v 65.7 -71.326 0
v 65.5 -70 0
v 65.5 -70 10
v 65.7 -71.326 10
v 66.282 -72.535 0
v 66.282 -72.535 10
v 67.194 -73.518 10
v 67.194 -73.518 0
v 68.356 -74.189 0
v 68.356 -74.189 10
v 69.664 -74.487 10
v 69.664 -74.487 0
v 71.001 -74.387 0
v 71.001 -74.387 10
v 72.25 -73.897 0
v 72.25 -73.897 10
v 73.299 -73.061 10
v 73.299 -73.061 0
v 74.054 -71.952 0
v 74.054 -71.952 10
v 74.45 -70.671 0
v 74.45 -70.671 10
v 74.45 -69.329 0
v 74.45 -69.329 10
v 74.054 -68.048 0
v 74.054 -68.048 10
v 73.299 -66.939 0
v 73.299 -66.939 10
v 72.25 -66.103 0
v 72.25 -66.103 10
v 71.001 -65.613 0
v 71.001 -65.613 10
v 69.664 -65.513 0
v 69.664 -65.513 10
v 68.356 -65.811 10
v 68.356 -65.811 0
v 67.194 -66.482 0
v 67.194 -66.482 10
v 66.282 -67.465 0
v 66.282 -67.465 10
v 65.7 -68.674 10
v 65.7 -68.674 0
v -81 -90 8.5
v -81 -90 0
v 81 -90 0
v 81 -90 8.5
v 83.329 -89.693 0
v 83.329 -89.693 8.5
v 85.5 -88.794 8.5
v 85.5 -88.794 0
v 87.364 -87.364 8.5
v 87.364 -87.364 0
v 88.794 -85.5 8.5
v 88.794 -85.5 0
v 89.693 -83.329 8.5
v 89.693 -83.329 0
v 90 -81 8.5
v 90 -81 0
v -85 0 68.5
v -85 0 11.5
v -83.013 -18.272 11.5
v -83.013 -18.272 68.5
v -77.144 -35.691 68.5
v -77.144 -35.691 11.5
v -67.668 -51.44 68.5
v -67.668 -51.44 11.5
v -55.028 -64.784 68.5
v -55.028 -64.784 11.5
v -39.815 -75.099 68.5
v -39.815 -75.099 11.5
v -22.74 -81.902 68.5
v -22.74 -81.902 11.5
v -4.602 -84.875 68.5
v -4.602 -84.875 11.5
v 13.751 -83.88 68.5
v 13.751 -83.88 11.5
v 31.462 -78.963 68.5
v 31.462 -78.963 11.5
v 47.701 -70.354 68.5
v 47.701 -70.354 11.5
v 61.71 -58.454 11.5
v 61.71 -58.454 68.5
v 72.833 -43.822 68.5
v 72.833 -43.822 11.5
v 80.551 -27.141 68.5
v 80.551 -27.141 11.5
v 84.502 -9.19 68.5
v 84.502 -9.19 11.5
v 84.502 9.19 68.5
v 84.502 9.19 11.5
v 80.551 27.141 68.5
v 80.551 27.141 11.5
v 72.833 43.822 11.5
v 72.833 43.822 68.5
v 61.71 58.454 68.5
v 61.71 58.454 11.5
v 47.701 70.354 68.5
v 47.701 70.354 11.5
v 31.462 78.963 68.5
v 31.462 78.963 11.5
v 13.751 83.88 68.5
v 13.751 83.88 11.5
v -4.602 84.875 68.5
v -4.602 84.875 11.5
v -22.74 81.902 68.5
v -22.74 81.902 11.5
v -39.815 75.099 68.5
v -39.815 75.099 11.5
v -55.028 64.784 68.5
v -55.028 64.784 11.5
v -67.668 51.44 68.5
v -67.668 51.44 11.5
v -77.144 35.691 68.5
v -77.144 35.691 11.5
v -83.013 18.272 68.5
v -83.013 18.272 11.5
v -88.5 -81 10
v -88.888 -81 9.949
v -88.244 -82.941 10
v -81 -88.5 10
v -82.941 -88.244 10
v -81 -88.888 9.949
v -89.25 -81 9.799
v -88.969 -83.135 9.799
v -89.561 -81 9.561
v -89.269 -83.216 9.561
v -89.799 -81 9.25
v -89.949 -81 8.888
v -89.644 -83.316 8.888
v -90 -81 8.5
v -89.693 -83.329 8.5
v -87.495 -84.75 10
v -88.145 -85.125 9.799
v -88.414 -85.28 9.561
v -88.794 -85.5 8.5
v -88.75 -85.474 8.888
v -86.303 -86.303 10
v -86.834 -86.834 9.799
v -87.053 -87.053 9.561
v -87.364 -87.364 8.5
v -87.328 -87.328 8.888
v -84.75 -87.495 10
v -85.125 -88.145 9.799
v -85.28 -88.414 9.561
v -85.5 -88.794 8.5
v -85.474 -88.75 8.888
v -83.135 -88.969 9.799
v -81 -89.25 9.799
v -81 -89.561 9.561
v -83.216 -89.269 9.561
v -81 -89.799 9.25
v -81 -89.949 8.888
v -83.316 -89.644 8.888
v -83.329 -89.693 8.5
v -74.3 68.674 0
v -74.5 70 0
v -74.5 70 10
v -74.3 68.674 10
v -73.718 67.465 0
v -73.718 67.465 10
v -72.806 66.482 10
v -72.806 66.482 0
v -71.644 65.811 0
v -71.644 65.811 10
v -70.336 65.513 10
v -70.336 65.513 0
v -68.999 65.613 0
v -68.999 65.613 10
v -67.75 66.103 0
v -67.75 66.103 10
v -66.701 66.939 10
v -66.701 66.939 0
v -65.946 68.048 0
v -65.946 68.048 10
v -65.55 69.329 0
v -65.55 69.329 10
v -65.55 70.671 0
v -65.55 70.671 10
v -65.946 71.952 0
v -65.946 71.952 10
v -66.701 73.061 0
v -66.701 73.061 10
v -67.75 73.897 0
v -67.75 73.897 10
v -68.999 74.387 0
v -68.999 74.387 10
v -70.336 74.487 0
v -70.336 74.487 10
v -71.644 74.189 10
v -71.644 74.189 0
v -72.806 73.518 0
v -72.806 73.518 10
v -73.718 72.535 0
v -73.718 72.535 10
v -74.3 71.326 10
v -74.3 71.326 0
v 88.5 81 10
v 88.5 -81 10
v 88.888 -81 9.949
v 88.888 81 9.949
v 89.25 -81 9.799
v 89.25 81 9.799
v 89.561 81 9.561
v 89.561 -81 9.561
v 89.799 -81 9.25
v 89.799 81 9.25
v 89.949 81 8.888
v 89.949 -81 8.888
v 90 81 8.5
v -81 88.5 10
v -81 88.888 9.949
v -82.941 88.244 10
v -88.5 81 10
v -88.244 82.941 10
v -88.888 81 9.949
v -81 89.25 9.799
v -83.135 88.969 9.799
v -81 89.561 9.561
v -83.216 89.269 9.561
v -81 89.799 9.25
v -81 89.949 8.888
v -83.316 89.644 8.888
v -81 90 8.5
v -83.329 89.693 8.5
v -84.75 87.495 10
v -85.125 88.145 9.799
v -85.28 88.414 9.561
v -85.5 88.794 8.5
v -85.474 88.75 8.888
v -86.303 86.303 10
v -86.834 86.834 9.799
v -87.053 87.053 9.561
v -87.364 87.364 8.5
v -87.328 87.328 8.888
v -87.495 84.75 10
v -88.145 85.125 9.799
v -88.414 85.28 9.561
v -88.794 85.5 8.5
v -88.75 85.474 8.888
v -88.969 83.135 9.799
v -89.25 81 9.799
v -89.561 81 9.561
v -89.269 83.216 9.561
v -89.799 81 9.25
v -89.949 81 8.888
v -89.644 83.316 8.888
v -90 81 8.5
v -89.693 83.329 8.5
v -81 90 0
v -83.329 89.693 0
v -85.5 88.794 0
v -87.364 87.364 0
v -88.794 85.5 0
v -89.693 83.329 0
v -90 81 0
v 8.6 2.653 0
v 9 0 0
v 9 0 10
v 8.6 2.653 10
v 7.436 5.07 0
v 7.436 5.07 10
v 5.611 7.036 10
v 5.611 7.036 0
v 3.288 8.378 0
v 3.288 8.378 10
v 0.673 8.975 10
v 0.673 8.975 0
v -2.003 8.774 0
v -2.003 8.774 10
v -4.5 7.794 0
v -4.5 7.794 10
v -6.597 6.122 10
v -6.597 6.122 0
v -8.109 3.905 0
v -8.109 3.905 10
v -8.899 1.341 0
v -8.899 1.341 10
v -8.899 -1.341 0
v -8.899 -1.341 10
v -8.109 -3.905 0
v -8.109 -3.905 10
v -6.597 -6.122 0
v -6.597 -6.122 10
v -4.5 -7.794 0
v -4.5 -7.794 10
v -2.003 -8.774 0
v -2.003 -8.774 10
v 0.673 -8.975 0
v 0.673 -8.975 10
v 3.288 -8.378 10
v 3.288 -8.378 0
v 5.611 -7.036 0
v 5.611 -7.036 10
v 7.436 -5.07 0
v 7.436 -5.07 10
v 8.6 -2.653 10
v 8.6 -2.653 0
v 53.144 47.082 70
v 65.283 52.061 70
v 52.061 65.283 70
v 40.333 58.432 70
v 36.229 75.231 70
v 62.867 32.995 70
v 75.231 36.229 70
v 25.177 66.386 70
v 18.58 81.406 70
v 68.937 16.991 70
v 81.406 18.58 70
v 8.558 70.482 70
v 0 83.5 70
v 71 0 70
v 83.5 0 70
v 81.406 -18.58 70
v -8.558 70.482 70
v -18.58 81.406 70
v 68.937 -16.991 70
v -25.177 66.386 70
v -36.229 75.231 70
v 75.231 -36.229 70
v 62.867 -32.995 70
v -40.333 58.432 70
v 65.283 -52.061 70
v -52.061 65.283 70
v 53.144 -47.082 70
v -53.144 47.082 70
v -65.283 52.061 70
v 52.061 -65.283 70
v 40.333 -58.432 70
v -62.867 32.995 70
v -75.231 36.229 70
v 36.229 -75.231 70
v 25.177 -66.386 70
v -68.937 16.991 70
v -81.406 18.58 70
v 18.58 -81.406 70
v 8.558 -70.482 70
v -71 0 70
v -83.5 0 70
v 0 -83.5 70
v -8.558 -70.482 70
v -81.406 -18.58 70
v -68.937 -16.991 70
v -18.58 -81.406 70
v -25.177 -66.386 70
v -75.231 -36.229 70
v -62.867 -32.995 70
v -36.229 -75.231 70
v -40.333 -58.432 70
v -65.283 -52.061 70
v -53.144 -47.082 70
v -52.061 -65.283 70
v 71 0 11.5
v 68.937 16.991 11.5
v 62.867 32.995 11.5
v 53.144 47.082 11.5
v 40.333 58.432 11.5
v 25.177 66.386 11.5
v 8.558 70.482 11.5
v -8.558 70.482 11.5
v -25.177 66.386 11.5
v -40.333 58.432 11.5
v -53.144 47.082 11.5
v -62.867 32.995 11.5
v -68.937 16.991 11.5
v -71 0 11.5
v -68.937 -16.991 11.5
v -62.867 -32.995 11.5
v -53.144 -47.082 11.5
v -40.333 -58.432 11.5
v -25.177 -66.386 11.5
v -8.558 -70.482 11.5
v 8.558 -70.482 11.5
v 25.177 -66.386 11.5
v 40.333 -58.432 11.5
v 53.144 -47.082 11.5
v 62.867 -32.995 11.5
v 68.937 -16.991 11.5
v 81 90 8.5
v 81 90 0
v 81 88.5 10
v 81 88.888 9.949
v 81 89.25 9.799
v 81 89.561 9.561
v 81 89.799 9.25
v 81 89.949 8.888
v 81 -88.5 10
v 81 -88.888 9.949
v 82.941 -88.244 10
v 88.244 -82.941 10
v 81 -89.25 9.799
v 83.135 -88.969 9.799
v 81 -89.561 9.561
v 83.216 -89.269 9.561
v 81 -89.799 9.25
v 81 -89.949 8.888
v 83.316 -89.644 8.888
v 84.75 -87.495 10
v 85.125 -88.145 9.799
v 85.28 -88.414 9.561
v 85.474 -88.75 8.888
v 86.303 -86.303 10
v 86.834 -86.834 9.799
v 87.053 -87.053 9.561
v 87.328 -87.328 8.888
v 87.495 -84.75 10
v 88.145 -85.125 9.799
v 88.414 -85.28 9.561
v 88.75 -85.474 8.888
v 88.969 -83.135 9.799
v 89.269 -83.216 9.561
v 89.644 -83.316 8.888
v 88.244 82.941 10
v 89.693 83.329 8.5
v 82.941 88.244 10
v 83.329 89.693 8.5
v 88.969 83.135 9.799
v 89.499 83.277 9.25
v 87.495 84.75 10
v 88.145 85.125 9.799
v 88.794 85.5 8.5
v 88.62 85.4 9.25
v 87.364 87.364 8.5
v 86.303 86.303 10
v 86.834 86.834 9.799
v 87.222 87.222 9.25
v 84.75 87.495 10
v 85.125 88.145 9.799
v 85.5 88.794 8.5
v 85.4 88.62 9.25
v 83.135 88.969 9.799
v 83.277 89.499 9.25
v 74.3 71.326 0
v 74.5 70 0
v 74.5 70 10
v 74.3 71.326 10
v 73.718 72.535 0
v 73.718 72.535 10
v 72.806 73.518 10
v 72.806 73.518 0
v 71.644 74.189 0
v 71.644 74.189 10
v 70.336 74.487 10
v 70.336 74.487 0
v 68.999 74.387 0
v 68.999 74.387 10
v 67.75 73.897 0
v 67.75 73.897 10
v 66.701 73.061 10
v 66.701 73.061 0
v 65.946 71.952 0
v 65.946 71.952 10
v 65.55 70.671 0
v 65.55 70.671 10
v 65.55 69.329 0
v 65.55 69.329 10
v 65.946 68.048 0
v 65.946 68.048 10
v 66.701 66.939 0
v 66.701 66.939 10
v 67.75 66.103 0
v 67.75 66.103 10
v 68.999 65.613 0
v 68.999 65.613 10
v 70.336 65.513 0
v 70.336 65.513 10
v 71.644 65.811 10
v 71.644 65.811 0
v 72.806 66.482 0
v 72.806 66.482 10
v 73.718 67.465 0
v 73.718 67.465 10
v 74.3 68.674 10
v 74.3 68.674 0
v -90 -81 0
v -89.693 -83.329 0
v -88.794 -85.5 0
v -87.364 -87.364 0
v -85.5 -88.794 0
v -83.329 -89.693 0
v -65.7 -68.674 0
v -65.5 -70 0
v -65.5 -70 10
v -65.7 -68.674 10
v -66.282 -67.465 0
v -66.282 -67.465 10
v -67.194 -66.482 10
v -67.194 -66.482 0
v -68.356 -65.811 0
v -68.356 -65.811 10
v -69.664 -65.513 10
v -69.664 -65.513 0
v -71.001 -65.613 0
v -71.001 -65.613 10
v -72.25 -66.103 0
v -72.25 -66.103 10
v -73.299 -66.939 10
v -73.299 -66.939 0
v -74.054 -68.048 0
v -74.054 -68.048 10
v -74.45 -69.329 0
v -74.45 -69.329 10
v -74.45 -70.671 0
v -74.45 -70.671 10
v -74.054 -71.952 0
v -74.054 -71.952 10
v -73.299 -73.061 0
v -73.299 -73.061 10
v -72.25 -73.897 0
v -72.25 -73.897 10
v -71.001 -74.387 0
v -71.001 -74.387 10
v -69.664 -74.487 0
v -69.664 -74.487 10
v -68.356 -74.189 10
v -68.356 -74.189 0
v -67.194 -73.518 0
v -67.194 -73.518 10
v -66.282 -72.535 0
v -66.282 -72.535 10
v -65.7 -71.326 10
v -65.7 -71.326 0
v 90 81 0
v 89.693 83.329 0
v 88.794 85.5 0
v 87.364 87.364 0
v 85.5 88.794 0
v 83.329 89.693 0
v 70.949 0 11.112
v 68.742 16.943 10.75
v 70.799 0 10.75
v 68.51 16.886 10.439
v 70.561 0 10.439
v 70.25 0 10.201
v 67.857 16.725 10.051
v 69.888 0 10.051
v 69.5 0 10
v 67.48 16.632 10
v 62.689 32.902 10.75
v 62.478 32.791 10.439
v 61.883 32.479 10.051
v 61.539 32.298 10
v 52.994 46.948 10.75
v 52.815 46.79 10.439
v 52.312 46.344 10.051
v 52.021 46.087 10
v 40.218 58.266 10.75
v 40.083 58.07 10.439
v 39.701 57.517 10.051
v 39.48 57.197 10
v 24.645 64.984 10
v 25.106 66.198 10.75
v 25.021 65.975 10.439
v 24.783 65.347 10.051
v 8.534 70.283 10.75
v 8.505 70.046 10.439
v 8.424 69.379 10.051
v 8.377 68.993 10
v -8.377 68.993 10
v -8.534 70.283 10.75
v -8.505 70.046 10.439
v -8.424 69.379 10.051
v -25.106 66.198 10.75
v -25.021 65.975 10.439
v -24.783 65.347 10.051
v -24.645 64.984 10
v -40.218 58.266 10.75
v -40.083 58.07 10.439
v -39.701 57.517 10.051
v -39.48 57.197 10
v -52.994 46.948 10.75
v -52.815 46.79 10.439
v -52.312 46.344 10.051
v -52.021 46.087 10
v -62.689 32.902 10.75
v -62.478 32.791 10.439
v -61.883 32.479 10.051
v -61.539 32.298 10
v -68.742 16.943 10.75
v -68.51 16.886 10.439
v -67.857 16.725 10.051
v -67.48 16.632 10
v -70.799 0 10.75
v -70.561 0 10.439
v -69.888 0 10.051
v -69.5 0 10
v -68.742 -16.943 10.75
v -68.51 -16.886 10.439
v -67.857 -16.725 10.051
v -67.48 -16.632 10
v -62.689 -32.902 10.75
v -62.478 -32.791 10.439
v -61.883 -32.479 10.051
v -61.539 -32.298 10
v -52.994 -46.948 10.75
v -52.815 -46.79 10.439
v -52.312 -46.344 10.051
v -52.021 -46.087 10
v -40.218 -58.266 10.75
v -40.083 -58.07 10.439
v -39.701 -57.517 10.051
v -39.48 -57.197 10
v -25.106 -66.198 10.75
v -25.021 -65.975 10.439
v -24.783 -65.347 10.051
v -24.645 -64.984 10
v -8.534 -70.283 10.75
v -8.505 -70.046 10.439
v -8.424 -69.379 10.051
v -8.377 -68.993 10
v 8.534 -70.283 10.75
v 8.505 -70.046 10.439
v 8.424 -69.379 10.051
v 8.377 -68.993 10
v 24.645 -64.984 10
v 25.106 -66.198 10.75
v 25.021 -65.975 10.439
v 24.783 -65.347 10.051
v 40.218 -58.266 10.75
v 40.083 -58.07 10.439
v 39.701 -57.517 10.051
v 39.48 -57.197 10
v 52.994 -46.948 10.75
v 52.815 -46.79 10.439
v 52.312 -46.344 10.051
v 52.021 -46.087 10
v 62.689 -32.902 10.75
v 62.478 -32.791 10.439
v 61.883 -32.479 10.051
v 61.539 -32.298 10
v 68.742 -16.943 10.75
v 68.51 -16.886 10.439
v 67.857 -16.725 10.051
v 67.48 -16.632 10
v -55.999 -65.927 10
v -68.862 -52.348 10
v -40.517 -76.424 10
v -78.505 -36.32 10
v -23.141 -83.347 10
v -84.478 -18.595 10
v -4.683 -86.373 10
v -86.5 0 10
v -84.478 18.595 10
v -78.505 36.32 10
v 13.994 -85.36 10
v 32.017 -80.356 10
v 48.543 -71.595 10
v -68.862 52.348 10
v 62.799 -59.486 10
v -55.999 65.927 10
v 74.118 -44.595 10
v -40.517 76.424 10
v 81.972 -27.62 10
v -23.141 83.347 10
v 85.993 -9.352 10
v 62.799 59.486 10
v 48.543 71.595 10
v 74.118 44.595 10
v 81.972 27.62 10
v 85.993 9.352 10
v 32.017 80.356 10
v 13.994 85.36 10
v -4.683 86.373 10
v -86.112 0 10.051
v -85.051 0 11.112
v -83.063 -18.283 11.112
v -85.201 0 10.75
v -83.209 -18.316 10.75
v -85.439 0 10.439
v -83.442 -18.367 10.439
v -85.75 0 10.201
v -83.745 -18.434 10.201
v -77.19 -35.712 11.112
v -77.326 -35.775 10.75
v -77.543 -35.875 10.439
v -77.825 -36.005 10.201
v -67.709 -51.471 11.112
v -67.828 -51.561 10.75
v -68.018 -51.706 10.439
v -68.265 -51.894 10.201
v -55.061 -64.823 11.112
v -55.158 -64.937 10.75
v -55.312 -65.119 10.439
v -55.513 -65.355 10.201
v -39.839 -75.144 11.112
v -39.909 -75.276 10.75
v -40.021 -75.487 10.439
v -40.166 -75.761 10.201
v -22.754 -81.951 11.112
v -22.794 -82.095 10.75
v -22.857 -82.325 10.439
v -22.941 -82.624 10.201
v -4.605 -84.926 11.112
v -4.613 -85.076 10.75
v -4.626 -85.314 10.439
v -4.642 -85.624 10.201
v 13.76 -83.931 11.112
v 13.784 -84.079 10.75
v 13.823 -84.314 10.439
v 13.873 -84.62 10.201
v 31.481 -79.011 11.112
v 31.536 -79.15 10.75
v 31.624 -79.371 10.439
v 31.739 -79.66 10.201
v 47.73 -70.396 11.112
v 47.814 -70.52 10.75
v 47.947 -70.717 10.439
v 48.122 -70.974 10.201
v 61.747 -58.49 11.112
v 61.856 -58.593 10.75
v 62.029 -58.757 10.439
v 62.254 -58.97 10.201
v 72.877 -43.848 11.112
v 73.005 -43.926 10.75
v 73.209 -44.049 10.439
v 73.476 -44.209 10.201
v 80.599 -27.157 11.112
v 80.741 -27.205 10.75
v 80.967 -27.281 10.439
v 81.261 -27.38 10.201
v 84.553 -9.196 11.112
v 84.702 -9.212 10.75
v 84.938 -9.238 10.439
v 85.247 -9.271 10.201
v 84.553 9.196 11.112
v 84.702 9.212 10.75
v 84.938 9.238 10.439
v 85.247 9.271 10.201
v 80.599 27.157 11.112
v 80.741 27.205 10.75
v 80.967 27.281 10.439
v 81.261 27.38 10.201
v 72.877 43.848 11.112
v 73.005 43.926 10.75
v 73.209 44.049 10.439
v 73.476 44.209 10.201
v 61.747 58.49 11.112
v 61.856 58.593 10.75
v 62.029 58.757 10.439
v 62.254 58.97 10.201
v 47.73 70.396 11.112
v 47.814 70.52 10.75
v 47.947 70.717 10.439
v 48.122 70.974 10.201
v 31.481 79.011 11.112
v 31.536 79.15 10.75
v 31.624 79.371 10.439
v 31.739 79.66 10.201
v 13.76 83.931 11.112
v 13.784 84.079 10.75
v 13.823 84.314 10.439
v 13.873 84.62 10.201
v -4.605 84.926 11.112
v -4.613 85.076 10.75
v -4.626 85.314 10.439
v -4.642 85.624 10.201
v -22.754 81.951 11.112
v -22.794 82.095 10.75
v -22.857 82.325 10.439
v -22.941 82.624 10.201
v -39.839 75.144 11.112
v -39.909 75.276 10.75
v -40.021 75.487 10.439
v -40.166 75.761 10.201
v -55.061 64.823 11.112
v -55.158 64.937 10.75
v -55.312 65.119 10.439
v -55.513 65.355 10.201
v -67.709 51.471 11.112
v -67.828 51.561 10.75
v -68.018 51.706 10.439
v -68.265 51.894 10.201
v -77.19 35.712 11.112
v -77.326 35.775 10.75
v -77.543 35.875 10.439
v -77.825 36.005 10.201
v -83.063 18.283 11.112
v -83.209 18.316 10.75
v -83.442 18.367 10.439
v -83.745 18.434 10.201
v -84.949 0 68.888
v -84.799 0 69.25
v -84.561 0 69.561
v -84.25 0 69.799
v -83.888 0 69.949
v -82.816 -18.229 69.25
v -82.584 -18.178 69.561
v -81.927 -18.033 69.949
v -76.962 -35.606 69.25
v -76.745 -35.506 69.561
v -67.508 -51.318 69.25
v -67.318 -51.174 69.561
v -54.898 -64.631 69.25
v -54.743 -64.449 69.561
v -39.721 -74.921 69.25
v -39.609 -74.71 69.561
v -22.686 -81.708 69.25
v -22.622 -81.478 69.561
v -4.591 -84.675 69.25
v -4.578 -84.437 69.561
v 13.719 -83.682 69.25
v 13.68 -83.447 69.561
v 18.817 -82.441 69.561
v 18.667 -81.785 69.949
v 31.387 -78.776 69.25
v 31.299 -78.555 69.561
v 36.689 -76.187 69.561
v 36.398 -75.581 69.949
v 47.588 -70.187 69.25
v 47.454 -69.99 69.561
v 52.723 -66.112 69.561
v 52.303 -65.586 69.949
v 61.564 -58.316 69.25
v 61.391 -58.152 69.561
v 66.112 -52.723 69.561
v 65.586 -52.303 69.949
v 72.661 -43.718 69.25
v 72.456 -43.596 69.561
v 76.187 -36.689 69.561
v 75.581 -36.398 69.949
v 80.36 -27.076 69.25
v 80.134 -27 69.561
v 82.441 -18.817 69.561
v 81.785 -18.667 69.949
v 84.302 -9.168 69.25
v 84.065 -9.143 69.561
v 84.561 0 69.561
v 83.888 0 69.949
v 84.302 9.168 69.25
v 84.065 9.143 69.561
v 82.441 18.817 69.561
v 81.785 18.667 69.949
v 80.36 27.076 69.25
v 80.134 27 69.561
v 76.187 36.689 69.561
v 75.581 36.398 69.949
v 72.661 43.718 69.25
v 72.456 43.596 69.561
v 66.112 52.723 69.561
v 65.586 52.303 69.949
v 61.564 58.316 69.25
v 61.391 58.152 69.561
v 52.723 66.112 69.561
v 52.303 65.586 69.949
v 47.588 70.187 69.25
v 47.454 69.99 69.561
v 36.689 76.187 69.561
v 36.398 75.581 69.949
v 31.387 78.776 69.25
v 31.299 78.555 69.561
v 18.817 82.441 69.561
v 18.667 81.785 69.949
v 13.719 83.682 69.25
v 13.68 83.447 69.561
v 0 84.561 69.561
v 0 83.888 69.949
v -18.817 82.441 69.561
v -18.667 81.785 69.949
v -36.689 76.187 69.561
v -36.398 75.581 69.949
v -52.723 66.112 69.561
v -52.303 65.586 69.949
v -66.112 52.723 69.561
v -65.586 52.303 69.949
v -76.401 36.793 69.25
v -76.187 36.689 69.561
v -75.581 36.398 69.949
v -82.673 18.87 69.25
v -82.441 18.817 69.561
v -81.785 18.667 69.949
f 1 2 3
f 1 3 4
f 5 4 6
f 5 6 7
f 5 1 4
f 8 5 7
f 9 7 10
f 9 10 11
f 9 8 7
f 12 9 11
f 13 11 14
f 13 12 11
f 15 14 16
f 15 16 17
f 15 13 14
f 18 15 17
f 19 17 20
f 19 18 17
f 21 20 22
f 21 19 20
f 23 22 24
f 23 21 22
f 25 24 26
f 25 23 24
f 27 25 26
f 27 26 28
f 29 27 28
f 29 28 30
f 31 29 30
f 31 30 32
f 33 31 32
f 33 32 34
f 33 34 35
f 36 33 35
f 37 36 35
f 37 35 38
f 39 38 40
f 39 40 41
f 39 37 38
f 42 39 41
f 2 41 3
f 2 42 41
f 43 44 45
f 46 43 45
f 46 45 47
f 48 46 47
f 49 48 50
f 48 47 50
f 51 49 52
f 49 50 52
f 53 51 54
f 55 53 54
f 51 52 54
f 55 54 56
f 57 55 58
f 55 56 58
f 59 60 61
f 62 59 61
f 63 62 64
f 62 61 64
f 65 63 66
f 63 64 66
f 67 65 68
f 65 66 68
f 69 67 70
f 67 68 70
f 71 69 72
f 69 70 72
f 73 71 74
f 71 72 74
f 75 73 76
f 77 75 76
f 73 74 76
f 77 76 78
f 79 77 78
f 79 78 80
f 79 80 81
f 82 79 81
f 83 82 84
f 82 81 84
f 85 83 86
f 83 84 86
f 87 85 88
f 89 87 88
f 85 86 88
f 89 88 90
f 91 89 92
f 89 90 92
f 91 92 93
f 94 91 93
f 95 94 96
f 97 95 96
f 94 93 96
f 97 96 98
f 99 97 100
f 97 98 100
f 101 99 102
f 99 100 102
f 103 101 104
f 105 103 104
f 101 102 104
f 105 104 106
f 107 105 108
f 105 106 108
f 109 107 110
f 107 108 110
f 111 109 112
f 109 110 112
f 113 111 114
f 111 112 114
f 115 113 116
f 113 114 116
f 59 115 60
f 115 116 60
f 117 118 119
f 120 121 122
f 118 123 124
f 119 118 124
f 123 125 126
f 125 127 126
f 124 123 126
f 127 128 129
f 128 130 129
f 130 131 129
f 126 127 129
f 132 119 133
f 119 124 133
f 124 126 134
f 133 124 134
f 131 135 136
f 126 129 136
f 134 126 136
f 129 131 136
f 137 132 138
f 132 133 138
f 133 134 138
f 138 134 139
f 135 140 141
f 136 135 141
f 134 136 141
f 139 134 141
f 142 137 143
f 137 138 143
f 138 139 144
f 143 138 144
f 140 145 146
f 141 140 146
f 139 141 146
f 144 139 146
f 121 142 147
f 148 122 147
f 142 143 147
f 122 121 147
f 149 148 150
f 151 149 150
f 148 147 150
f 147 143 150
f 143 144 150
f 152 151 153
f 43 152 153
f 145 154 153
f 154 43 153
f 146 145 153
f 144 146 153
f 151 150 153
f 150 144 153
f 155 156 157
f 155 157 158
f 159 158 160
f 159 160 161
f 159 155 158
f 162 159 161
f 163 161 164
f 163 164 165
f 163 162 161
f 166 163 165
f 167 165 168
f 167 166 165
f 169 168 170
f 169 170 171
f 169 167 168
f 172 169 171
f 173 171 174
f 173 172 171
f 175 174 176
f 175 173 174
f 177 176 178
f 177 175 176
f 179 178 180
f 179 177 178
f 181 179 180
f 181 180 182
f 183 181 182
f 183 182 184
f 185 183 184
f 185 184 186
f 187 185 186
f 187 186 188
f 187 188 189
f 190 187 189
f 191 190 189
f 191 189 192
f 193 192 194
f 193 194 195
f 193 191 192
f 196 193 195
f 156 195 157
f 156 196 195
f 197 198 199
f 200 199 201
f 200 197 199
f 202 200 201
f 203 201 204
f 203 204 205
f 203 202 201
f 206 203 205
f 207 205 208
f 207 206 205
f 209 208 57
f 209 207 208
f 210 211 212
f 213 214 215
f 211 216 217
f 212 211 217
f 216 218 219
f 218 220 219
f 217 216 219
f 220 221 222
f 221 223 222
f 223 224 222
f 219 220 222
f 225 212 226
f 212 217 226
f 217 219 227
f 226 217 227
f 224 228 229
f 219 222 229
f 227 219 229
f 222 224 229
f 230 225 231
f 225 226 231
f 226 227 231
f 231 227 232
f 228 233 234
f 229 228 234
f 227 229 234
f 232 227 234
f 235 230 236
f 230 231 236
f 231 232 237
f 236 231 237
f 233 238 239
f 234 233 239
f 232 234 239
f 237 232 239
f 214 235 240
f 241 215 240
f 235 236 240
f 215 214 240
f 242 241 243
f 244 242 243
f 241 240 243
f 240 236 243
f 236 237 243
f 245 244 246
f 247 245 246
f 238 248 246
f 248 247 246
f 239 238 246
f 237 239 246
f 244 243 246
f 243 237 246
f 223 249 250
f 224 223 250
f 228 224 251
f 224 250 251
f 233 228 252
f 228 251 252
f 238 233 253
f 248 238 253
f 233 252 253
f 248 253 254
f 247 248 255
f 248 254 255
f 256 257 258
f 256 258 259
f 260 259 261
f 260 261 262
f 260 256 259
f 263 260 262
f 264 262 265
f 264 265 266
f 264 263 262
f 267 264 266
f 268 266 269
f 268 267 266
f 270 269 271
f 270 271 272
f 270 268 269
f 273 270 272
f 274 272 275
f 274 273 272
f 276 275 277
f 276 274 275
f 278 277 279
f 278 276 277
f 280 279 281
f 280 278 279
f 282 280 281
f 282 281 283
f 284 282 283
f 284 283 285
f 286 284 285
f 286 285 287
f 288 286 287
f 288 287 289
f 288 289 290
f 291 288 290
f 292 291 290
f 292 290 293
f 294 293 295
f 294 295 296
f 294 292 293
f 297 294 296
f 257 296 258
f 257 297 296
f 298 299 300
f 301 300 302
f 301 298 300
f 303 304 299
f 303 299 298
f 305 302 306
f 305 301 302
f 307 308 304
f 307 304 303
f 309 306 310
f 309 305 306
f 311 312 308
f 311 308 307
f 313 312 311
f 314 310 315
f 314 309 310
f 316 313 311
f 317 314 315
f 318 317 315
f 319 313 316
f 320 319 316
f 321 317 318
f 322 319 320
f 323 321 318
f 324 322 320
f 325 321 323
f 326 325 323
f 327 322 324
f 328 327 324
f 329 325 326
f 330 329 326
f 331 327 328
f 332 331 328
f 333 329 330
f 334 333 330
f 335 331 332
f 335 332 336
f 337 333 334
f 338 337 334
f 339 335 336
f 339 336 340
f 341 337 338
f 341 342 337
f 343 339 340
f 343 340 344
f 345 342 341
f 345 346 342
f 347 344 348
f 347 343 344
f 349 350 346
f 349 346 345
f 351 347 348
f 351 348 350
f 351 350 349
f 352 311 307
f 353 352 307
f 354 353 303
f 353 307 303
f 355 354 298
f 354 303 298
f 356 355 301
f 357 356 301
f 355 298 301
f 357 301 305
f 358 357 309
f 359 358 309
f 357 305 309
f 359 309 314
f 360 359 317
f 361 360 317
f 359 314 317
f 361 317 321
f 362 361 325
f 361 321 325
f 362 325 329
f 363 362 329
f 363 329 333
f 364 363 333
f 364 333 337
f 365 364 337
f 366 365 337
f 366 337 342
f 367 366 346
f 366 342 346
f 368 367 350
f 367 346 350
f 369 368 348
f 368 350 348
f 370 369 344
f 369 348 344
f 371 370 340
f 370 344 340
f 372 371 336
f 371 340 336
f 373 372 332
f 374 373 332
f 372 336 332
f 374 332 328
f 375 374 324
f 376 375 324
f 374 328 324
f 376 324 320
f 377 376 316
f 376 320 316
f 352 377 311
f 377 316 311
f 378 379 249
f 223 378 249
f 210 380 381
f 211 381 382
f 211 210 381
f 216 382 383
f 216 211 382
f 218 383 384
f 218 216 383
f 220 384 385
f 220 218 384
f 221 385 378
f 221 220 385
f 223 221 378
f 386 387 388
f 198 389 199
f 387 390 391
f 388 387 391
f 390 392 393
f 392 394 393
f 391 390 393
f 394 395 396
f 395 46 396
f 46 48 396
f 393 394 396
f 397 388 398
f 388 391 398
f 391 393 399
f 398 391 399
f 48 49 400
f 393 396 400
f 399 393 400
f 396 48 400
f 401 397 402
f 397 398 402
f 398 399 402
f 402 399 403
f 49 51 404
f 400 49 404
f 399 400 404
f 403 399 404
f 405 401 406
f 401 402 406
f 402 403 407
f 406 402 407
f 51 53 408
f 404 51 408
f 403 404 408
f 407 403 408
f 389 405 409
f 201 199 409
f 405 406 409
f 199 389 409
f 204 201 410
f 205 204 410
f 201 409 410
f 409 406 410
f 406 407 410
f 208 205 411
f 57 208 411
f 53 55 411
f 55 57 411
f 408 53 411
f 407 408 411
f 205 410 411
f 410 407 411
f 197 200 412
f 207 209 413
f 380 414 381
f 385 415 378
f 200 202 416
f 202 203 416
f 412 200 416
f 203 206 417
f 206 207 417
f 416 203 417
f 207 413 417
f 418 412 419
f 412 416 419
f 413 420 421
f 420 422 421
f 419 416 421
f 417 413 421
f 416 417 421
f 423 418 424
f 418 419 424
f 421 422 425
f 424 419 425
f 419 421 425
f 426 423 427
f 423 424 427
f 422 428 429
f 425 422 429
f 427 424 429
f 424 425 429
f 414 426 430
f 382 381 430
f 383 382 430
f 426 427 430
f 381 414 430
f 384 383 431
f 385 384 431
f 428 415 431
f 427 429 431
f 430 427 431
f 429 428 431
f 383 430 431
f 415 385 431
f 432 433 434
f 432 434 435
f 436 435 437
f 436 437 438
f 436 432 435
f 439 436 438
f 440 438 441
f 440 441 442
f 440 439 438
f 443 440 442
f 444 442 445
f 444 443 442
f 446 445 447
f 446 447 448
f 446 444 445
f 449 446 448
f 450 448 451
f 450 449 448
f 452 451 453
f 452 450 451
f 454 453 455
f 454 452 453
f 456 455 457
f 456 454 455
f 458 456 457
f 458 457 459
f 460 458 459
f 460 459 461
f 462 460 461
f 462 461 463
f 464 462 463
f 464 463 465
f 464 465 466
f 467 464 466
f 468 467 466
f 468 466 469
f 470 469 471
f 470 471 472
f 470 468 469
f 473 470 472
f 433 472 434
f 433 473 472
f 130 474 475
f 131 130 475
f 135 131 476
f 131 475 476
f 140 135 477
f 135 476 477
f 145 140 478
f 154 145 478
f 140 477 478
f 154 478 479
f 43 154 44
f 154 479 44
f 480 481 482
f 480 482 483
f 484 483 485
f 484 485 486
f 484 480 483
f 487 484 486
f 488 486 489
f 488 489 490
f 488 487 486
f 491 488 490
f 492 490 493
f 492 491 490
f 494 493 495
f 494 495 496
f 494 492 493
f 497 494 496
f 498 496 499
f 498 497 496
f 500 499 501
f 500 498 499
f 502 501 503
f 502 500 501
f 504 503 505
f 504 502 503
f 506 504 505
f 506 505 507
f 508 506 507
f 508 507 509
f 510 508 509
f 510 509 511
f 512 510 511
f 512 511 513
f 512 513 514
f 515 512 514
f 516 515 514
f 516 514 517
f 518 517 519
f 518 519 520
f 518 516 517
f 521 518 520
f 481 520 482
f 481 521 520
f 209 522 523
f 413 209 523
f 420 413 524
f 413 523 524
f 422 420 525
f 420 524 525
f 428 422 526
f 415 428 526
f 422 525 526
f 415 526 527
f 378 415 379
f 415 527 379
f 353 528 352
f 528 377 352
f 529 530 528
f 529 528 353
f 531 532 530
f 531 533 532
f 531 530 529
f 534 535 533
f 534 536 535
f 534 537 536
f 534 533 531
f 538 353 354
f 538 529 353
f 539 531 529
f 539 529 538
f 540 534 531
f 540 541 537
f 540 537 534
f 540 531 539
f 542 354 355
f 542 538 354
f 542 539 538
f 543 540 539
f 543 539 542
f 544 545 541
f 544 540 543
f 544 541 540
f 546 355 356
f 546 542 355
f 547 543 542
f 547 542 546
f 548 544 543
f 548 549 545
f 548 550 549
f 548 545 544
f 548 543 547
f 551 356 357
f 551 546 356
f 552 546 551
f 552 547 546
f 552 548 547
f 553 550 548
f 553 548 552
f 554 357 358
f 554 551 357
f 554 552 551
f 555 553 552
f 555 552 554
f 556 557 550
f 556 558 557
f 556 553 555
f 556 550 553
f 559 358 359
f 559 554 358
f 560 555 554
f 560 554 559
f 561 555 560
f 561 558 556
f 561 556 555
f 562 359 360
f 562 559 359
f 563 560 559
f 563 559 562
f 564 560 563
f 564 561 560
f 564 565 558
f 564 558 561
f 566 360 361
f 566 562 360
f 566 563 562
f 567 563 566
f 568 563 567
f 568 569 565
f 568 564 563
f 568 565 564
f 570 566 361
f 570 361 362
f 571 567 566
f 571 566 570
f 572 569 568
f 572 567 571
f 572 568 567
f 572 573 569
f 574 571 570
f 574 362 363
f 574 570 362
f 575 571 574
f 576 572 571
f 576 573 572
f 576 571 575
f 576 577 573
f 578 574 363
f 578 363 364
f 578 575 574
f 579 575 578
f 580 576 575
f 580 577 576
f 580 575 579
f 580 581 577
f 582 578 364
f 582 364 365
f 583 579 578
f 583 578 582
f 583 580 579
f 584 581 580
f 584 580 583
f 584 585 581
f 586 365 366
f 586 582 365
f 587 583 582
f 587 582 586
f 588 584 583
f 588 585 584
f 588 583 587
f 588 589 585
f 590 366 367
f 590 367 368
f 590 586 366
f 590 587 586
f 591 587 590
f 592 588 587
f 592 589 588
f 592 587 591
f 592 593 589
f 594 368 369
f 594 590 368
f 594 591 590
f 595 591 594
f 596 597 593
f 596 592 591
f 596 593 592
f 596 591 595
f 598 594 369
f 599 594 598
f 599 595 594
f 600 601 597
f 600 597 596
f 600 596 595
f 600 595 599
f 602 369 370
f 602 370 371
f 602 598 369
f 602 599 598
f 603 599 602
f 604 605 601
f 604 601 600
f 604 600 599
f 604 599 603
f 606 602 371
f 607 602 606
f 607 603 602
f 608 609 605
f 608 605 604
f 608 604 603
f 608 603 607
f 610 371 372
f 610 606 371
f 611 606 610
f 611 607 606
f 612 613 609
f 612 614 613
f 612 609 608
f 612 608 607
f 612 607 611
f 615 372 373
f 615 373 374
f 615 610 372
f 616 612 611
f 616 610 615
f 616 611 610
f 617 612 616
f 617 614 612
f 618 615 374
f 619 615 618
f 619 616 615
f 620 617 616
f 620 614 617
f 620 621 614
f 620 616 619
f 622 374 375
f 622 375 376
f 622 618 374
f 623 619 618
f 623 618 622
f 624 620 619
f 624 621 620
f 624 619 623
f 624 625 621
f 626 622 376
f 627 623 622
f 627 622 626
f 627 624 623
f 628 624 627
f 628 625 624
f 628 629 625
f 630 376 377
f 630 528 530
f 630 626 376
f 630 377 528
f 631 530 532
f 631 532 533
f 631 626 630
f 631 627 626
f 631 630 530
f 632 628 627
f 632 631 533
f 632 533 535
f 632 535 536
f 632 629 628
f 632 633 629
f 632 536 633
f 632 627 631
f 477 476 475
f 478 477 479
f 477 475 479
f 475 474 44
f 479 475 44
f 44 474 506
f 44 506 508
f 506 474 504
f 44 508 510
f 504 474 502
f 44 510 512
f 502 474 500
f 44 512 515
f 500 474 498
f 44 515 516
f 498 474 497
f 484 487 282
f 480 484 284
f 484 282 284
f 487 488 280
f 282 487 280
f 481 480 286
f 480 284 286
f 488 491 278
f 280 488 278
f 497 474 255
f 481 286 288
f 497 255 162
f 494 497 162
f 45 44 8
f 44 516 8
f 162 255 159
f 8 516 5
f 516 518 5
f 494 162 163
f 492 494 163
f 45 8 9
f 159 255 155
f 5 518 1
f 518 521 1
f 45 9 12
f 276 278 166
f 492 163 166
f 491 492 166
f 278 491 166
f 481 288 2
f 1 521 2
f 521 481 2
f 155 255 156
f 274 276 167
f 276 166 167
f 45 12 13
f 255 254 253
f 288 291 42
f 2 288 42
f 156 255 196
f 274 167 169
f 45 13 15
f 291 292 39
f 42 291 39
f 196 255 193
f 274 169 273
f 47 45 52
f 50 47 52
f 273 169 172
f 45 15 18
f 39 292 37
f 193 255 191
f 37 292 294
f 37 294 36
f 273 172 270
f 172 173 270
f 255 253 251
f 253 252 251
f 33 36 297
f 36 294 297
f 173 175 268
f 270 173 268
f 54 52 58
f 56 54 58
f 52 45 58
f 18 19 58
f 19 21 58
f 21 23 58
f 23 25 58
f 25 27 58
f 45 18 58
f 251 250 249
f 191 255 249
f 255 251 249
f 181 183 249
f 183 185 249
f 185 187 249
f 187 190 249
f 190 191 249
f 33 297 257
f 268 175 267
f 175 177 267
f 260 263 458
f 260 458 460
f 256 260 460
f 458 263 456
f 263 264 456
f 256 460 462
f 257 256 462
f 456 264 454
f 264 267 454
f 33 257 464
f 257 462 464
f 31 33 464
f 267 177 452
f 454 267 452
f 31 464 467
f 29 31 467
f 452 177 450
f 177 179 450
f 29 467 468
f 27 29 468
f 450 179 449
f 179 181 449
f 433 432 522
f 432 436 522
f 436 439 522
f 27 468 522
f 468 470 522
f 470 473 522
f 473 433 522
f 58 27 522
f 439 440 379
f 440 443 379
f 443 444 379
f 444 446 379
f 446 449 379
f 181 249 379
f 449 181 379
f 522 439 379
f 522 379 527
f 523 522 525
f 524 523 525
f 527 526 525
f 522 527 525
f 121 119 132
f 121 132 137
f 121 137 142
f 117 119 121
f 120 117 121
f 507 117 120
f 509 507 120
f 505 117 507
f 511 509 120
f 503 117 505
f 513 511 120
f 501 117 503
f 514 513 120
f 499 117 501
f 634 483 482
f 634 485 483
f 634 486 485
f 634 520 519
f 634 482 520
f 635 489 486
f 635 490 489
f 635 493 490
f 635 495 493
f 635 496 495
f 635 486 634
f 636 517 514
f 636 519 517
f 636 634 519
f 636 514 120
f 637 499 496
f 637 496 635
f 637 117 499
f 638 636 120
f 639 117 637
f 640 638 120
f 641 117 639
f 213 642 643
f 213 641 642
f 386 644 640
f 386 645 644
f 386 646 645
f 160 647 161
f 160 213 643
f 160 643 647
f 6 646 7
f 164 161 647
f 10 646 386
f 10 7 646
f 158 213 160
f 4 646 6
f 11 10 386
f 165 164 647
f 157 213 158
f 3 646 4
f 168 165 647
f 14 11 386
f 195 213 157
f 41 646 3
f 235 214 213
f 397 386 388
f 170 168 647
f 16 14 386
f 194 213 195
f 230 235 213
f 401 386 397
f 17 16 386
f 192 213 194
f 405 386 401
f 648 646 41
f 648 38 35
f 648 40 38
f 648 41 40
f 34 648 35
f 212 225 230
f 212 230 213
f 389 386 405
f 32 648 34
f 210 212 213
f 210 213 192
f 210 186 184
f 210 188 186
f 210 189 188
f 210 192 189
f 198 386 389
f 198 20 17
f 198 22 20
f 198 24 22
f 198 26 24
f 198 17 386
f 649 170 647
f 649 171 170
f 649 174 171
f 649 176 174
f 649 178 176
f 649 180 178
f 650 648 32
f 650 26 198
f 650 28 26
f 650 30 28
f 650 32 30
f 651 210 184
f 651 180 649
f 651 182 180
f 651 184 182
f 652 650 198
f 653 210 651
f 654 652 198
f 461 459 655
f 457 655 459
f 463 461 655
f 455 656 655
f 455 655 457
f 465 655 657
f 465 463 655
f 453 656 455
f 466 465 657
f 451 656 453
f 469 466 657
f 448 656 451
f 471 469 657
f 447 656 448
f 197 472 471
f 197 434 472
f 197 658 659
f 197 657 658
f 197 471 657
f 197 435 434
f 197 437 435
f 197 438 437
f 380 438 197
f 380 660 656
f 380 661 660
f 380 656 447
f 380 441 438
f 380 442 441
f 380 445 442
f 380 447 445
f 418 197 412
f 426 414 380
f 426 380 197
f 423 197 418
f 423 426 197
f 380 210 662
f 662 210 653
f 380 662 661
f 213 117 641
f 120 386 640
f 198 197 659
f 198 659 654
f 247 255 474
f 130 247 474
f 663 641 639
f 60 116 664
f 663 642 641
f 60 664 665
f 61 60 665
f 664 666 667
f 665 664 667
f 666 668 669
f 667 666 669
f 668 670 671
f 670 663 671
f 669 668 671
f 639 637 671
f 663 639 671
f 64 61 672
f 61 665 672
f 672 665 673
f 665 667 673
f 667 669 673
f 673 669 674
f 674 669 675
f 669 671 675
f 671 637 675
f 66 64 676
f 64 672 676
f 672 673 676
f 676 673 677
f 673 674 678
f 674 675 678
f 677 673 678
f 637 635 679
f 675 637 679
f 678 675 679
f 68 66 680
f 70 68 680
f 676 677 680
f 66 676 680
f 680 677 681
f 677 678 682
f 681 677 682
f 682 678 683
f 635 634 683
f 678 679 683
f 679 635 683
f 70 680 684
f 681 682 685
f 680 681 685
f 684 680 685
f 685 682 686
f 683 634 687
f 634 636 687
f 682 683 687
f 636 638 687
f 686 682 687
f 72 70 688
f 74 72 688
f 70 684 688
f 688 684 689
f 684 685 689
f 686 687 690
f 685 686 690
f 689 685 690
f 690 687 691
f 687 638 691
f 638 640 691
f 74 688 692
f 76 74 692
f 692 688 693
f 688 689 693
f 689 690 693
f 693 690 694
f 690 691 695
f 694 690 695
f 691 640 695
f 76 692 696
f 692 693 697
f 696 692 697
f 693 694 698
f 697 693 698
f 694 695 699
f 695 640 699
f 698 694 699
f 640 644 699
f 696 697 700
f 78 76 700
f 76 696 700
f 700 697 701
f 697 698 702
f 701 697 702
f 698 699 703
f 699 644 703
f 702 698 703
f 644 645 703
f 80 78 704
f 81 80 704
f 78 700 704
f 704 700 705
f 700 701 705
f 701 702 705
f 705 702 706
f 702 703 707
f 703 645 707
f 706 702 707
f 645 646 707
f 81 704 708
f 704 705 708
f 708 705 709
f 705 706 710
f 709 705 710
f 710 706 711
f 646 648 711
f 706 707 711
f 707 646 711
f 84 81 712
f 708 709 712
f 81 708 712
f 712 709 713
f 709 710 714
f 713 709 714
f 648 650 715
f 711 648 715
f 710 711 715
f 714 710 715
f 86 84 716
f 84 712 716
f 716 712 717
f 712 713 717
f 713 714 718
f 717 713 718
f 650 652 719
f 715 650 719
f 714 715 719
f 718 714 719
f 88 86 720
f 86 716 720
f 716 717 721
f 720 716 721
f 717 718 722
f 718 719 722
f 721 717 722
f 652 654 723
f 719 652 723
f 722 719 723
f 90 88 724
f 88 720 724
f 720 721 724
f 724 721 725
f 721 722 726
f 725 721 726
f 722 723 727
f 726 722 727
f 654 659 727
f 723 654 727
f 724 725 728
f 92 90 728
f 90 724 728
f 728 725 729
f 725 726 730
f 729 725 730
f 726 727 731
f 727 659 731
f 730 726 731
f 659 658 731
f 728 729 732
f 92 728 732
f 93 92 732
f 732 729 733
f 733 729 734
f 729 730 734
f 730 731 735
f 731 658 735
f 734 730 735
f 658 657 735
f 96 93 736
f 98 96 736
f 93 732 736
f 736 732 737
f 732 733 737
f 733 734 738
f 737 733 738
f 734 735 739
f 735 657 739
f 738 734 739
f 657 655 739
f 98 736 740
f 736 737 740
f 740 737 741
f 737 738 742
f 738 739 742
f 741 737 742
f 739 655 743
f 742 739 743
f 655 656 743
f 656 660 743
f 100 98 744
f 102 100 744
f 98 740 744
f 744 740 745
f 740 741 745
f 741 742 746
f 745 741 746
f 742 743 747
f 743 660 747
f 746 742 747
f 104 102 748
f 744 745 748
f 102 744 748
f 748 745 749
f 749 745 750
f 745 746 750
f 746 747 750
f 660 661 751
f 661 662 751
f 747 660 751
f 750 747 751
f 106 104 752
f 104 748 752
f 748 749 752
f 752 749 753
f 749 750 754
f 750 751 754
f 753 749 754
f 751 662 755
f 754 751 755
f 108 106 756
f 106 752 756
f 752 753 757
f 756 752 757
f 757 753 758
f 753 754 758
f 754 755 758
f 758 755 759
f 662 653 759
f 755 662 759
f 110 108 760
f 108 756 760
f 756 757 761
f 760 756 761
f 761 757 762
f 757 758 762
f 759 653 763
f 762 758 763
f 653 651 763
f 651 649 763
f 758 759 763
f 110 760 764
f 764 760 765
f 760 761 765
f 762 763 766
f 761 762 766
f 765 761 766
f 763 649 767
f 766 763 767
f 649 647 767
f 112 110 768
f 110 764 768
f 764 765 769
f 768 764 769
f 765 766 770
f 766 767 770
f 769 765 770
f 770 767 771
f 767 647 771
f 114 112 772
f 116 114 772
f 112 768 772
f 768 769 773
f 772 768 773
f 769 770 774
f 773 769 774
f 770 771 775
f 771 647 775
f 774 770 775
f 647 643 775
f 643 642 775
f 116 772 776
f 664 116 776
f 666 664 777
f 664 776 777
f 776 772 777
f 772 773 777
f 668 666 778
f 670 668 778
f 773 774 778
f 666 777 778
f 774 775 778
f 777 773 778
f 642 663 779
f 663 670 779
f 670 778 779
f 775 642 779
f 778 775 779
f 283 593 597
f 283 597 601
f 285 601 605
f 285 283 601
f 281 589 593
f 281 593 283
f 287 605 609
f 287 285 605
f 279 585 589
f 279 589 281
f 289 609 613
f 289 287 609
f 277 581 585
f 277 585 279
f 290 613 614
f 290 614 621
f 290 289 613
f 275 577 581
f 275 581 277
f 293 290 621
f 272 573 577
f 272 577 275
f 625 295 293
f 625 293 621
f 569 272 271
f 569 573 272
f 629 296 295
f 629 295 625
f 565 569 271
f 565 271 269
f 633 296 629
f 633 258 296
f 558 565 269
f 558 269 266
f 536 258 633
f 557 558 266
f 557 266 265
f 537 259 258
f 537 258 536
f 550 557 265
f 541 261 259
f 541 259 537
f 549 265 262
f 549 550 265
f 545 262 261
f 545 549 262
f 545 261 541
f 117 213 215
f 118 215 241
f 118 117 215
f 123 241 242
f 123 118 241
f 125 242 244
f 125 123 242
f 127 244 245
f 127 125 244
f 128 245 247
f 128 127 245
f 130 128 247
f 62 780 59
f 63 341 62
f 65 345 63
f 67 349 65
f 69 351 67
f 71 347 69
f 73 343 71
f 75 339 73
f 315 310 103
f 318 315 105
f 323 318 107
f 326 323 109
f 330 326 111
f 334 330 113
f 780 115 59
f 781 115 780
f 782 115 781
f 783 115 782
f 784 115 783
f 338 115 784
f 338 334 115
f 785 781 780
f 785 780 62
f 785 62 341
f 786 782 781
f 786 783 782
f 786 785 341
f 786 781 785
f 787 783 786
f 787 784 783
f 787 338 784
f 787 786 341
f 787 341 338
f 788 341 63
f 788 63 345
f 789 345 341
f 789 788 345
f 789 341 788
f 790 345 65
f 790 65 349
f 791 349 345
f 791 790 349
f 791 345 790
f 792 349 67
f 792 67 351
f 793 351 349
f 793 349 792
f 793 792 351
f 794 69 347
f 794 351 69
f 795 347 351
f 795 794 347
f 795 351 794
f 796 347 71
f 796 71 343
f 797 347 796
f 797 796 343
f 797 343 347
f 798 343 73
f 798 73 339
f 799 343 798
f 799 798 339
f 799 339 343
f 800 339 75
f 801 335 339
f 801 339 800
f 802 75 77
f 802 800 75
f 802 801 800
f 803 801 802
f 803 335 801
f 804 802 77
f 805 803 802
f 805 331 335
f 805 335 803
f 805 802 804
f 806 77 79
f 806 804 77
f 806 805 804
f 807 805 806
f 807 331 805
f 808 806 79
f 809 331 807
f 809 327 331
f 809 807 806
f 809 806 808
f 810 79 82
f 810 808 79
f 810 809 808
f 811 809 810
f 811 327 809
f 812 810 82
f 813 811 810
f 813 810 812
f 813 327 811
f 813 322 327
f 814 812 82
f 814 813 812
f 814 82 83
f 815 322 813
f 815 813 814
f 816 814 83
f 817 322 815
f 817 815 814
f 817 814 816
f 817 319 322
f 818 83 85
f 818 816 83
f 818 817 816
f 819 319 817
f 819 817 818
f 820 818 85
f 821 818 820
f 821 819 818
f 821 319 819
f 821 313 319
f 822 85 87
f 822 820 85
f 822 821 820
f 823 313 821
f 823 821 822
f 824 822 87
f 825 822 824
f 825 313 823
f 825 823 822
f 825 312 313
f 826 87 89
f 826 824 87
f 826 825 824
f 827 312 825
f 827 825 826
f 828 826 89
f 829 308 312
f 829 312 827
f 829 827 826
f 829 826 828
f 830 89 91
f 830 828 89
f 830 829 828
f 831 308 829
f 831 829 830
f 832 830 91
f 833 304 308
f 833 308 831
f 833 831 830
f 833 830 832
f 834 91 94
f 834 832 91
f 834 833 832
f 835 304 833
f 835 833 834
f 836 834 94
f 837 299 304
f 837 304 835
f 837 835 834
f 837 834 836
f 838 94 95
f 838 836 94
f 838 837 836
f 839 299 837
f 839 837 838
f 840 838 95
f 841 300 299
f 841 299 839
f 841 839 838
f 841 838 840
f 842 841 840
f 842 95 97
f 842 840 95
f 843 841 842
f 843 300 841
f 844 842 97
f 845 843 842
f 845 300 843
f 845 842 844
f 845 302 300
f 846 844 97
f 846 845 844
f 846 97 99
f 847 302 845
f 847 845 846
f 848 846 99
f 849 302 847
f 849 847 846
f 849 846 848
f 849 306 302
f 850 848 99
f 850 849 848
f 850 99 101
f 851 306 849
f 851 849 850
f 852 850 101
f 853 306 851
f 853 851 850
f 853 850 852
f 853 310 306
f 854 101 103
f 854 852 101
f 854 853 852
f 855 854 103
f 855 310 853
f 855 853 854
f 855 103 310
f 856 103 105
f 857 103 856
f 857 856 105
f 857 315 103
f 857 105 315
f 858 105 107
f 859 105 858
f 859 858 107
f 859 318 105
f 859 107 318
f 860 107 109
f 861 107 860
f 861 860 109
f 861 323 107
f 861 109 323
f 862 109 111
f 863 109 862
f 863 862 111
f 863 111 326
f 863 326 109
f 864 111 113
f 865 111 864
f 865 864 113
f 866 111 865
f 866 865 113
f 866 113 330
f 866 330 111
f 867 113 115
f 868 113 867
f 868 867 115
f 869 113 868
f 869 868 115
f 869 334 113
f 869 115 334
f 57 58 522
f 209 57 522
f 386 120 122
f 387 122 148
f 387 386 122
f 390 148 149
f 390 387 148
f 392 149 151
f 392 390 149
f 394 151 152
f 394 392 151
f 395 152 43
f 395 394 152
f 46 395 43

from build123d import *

# Parameters (mm, degrees)
SKETCH1_R           = 9
SKETCH1_R_2         = 4.5
BOSS_EXTRUDE1_DEPTH = 10
SKETCH2_R           = 85
BOSS_EXTRUDE2_DEPTH = 60
SKETCH3_R           = 71
CUT_EXTRUDE1_DEPTH  = 60
FILLET1_R           = 1.5


with BuildPart() as part:
    # Sketch1 → Boss-Extrude1 (new body)
    with BuildSketch(Plane.XY):
        with BuildLine():
            Line((-81, -90), (81, -90))
            ThreePointArc((81, -90), (87.363961031, -87.363961031), (90, -81))
            Line((90, -81), (90, 81))
            ThreePointArc((90, 81), (87.363961031, 87.363961031), (81, 90))
            Line((81, 90), (-81, 90))
            ThreePointArc((-81, 90), (-87.363961031, 87.363961031), (-90, 81))
            Line((-90, 81), (-90, -81))
            ThreePointArc((-90, -81), (-87.363961031, -87.363961031), (-81, -90))
        make_face()
        Circle(SKETCH1_R, mode=Mode.SUBTRACT)
        with Locations((70, 70)):
            Circle(SKETCH1_R_2, mode=Mode.SUBTRACT)
        with Locations(Location((-70, 70, 0), (0, 0, 180))):
            Circle(SKETCH1_R_2, mode=Mode.SUBTRACT)
        with Locations(Location((70, -70, 0), (0, 0, 180))):
            Circle(SKETCH1_R_2, mode=Mode.SUBTRACT)
        with Locations((-70, -70)):
            Circle(SKETCH1_R_2, mode=Mode.SUBTRACT)
    extrude(amount=BOSS_EXTRUDE1_DEPTH)

    # Sketch2 → Boss-Extrude2 (add)
    with BuildSketch(Plane.XY.offset(10)):
        with Locations(Location((0, 0, 0), (0, 0, 180))):
            Circle(SKETCH2_R)
    extrude(amount=BOSS_EXTRUDE2_DEPTH)

    # Sketch3 → Cut-Extrude1 (cut)
    with BuildSketch(Plane.XY.offset(70)):
        Circle(SKETCH3_R)
    extrude(amount=-CUT_EXTRUDE1_DEPTH, mode=Mode.SUBTRACT)

    # Fillet1
    fillet1_edges = [part.edges().sort_by_distance(p)[0] for p in [
        (87.363961031, 87.363961031, 10),
        (0, 90, 10),
        (-87.363961031, 87.363961031, 10),
        (-90, 0, 10),
        (-87.363961031, -87.363961031, 10),
        (0, -90, 10),
        (87.363961031, -87.363961031, 10),
        (85, 0, 10),
        (85, 0, 70),
        (-71, 0, 10),
        (90, 0, 10),
    ]]
    fillet(fillet1_edges, radius=FILLET1_R)


solid = part.part
